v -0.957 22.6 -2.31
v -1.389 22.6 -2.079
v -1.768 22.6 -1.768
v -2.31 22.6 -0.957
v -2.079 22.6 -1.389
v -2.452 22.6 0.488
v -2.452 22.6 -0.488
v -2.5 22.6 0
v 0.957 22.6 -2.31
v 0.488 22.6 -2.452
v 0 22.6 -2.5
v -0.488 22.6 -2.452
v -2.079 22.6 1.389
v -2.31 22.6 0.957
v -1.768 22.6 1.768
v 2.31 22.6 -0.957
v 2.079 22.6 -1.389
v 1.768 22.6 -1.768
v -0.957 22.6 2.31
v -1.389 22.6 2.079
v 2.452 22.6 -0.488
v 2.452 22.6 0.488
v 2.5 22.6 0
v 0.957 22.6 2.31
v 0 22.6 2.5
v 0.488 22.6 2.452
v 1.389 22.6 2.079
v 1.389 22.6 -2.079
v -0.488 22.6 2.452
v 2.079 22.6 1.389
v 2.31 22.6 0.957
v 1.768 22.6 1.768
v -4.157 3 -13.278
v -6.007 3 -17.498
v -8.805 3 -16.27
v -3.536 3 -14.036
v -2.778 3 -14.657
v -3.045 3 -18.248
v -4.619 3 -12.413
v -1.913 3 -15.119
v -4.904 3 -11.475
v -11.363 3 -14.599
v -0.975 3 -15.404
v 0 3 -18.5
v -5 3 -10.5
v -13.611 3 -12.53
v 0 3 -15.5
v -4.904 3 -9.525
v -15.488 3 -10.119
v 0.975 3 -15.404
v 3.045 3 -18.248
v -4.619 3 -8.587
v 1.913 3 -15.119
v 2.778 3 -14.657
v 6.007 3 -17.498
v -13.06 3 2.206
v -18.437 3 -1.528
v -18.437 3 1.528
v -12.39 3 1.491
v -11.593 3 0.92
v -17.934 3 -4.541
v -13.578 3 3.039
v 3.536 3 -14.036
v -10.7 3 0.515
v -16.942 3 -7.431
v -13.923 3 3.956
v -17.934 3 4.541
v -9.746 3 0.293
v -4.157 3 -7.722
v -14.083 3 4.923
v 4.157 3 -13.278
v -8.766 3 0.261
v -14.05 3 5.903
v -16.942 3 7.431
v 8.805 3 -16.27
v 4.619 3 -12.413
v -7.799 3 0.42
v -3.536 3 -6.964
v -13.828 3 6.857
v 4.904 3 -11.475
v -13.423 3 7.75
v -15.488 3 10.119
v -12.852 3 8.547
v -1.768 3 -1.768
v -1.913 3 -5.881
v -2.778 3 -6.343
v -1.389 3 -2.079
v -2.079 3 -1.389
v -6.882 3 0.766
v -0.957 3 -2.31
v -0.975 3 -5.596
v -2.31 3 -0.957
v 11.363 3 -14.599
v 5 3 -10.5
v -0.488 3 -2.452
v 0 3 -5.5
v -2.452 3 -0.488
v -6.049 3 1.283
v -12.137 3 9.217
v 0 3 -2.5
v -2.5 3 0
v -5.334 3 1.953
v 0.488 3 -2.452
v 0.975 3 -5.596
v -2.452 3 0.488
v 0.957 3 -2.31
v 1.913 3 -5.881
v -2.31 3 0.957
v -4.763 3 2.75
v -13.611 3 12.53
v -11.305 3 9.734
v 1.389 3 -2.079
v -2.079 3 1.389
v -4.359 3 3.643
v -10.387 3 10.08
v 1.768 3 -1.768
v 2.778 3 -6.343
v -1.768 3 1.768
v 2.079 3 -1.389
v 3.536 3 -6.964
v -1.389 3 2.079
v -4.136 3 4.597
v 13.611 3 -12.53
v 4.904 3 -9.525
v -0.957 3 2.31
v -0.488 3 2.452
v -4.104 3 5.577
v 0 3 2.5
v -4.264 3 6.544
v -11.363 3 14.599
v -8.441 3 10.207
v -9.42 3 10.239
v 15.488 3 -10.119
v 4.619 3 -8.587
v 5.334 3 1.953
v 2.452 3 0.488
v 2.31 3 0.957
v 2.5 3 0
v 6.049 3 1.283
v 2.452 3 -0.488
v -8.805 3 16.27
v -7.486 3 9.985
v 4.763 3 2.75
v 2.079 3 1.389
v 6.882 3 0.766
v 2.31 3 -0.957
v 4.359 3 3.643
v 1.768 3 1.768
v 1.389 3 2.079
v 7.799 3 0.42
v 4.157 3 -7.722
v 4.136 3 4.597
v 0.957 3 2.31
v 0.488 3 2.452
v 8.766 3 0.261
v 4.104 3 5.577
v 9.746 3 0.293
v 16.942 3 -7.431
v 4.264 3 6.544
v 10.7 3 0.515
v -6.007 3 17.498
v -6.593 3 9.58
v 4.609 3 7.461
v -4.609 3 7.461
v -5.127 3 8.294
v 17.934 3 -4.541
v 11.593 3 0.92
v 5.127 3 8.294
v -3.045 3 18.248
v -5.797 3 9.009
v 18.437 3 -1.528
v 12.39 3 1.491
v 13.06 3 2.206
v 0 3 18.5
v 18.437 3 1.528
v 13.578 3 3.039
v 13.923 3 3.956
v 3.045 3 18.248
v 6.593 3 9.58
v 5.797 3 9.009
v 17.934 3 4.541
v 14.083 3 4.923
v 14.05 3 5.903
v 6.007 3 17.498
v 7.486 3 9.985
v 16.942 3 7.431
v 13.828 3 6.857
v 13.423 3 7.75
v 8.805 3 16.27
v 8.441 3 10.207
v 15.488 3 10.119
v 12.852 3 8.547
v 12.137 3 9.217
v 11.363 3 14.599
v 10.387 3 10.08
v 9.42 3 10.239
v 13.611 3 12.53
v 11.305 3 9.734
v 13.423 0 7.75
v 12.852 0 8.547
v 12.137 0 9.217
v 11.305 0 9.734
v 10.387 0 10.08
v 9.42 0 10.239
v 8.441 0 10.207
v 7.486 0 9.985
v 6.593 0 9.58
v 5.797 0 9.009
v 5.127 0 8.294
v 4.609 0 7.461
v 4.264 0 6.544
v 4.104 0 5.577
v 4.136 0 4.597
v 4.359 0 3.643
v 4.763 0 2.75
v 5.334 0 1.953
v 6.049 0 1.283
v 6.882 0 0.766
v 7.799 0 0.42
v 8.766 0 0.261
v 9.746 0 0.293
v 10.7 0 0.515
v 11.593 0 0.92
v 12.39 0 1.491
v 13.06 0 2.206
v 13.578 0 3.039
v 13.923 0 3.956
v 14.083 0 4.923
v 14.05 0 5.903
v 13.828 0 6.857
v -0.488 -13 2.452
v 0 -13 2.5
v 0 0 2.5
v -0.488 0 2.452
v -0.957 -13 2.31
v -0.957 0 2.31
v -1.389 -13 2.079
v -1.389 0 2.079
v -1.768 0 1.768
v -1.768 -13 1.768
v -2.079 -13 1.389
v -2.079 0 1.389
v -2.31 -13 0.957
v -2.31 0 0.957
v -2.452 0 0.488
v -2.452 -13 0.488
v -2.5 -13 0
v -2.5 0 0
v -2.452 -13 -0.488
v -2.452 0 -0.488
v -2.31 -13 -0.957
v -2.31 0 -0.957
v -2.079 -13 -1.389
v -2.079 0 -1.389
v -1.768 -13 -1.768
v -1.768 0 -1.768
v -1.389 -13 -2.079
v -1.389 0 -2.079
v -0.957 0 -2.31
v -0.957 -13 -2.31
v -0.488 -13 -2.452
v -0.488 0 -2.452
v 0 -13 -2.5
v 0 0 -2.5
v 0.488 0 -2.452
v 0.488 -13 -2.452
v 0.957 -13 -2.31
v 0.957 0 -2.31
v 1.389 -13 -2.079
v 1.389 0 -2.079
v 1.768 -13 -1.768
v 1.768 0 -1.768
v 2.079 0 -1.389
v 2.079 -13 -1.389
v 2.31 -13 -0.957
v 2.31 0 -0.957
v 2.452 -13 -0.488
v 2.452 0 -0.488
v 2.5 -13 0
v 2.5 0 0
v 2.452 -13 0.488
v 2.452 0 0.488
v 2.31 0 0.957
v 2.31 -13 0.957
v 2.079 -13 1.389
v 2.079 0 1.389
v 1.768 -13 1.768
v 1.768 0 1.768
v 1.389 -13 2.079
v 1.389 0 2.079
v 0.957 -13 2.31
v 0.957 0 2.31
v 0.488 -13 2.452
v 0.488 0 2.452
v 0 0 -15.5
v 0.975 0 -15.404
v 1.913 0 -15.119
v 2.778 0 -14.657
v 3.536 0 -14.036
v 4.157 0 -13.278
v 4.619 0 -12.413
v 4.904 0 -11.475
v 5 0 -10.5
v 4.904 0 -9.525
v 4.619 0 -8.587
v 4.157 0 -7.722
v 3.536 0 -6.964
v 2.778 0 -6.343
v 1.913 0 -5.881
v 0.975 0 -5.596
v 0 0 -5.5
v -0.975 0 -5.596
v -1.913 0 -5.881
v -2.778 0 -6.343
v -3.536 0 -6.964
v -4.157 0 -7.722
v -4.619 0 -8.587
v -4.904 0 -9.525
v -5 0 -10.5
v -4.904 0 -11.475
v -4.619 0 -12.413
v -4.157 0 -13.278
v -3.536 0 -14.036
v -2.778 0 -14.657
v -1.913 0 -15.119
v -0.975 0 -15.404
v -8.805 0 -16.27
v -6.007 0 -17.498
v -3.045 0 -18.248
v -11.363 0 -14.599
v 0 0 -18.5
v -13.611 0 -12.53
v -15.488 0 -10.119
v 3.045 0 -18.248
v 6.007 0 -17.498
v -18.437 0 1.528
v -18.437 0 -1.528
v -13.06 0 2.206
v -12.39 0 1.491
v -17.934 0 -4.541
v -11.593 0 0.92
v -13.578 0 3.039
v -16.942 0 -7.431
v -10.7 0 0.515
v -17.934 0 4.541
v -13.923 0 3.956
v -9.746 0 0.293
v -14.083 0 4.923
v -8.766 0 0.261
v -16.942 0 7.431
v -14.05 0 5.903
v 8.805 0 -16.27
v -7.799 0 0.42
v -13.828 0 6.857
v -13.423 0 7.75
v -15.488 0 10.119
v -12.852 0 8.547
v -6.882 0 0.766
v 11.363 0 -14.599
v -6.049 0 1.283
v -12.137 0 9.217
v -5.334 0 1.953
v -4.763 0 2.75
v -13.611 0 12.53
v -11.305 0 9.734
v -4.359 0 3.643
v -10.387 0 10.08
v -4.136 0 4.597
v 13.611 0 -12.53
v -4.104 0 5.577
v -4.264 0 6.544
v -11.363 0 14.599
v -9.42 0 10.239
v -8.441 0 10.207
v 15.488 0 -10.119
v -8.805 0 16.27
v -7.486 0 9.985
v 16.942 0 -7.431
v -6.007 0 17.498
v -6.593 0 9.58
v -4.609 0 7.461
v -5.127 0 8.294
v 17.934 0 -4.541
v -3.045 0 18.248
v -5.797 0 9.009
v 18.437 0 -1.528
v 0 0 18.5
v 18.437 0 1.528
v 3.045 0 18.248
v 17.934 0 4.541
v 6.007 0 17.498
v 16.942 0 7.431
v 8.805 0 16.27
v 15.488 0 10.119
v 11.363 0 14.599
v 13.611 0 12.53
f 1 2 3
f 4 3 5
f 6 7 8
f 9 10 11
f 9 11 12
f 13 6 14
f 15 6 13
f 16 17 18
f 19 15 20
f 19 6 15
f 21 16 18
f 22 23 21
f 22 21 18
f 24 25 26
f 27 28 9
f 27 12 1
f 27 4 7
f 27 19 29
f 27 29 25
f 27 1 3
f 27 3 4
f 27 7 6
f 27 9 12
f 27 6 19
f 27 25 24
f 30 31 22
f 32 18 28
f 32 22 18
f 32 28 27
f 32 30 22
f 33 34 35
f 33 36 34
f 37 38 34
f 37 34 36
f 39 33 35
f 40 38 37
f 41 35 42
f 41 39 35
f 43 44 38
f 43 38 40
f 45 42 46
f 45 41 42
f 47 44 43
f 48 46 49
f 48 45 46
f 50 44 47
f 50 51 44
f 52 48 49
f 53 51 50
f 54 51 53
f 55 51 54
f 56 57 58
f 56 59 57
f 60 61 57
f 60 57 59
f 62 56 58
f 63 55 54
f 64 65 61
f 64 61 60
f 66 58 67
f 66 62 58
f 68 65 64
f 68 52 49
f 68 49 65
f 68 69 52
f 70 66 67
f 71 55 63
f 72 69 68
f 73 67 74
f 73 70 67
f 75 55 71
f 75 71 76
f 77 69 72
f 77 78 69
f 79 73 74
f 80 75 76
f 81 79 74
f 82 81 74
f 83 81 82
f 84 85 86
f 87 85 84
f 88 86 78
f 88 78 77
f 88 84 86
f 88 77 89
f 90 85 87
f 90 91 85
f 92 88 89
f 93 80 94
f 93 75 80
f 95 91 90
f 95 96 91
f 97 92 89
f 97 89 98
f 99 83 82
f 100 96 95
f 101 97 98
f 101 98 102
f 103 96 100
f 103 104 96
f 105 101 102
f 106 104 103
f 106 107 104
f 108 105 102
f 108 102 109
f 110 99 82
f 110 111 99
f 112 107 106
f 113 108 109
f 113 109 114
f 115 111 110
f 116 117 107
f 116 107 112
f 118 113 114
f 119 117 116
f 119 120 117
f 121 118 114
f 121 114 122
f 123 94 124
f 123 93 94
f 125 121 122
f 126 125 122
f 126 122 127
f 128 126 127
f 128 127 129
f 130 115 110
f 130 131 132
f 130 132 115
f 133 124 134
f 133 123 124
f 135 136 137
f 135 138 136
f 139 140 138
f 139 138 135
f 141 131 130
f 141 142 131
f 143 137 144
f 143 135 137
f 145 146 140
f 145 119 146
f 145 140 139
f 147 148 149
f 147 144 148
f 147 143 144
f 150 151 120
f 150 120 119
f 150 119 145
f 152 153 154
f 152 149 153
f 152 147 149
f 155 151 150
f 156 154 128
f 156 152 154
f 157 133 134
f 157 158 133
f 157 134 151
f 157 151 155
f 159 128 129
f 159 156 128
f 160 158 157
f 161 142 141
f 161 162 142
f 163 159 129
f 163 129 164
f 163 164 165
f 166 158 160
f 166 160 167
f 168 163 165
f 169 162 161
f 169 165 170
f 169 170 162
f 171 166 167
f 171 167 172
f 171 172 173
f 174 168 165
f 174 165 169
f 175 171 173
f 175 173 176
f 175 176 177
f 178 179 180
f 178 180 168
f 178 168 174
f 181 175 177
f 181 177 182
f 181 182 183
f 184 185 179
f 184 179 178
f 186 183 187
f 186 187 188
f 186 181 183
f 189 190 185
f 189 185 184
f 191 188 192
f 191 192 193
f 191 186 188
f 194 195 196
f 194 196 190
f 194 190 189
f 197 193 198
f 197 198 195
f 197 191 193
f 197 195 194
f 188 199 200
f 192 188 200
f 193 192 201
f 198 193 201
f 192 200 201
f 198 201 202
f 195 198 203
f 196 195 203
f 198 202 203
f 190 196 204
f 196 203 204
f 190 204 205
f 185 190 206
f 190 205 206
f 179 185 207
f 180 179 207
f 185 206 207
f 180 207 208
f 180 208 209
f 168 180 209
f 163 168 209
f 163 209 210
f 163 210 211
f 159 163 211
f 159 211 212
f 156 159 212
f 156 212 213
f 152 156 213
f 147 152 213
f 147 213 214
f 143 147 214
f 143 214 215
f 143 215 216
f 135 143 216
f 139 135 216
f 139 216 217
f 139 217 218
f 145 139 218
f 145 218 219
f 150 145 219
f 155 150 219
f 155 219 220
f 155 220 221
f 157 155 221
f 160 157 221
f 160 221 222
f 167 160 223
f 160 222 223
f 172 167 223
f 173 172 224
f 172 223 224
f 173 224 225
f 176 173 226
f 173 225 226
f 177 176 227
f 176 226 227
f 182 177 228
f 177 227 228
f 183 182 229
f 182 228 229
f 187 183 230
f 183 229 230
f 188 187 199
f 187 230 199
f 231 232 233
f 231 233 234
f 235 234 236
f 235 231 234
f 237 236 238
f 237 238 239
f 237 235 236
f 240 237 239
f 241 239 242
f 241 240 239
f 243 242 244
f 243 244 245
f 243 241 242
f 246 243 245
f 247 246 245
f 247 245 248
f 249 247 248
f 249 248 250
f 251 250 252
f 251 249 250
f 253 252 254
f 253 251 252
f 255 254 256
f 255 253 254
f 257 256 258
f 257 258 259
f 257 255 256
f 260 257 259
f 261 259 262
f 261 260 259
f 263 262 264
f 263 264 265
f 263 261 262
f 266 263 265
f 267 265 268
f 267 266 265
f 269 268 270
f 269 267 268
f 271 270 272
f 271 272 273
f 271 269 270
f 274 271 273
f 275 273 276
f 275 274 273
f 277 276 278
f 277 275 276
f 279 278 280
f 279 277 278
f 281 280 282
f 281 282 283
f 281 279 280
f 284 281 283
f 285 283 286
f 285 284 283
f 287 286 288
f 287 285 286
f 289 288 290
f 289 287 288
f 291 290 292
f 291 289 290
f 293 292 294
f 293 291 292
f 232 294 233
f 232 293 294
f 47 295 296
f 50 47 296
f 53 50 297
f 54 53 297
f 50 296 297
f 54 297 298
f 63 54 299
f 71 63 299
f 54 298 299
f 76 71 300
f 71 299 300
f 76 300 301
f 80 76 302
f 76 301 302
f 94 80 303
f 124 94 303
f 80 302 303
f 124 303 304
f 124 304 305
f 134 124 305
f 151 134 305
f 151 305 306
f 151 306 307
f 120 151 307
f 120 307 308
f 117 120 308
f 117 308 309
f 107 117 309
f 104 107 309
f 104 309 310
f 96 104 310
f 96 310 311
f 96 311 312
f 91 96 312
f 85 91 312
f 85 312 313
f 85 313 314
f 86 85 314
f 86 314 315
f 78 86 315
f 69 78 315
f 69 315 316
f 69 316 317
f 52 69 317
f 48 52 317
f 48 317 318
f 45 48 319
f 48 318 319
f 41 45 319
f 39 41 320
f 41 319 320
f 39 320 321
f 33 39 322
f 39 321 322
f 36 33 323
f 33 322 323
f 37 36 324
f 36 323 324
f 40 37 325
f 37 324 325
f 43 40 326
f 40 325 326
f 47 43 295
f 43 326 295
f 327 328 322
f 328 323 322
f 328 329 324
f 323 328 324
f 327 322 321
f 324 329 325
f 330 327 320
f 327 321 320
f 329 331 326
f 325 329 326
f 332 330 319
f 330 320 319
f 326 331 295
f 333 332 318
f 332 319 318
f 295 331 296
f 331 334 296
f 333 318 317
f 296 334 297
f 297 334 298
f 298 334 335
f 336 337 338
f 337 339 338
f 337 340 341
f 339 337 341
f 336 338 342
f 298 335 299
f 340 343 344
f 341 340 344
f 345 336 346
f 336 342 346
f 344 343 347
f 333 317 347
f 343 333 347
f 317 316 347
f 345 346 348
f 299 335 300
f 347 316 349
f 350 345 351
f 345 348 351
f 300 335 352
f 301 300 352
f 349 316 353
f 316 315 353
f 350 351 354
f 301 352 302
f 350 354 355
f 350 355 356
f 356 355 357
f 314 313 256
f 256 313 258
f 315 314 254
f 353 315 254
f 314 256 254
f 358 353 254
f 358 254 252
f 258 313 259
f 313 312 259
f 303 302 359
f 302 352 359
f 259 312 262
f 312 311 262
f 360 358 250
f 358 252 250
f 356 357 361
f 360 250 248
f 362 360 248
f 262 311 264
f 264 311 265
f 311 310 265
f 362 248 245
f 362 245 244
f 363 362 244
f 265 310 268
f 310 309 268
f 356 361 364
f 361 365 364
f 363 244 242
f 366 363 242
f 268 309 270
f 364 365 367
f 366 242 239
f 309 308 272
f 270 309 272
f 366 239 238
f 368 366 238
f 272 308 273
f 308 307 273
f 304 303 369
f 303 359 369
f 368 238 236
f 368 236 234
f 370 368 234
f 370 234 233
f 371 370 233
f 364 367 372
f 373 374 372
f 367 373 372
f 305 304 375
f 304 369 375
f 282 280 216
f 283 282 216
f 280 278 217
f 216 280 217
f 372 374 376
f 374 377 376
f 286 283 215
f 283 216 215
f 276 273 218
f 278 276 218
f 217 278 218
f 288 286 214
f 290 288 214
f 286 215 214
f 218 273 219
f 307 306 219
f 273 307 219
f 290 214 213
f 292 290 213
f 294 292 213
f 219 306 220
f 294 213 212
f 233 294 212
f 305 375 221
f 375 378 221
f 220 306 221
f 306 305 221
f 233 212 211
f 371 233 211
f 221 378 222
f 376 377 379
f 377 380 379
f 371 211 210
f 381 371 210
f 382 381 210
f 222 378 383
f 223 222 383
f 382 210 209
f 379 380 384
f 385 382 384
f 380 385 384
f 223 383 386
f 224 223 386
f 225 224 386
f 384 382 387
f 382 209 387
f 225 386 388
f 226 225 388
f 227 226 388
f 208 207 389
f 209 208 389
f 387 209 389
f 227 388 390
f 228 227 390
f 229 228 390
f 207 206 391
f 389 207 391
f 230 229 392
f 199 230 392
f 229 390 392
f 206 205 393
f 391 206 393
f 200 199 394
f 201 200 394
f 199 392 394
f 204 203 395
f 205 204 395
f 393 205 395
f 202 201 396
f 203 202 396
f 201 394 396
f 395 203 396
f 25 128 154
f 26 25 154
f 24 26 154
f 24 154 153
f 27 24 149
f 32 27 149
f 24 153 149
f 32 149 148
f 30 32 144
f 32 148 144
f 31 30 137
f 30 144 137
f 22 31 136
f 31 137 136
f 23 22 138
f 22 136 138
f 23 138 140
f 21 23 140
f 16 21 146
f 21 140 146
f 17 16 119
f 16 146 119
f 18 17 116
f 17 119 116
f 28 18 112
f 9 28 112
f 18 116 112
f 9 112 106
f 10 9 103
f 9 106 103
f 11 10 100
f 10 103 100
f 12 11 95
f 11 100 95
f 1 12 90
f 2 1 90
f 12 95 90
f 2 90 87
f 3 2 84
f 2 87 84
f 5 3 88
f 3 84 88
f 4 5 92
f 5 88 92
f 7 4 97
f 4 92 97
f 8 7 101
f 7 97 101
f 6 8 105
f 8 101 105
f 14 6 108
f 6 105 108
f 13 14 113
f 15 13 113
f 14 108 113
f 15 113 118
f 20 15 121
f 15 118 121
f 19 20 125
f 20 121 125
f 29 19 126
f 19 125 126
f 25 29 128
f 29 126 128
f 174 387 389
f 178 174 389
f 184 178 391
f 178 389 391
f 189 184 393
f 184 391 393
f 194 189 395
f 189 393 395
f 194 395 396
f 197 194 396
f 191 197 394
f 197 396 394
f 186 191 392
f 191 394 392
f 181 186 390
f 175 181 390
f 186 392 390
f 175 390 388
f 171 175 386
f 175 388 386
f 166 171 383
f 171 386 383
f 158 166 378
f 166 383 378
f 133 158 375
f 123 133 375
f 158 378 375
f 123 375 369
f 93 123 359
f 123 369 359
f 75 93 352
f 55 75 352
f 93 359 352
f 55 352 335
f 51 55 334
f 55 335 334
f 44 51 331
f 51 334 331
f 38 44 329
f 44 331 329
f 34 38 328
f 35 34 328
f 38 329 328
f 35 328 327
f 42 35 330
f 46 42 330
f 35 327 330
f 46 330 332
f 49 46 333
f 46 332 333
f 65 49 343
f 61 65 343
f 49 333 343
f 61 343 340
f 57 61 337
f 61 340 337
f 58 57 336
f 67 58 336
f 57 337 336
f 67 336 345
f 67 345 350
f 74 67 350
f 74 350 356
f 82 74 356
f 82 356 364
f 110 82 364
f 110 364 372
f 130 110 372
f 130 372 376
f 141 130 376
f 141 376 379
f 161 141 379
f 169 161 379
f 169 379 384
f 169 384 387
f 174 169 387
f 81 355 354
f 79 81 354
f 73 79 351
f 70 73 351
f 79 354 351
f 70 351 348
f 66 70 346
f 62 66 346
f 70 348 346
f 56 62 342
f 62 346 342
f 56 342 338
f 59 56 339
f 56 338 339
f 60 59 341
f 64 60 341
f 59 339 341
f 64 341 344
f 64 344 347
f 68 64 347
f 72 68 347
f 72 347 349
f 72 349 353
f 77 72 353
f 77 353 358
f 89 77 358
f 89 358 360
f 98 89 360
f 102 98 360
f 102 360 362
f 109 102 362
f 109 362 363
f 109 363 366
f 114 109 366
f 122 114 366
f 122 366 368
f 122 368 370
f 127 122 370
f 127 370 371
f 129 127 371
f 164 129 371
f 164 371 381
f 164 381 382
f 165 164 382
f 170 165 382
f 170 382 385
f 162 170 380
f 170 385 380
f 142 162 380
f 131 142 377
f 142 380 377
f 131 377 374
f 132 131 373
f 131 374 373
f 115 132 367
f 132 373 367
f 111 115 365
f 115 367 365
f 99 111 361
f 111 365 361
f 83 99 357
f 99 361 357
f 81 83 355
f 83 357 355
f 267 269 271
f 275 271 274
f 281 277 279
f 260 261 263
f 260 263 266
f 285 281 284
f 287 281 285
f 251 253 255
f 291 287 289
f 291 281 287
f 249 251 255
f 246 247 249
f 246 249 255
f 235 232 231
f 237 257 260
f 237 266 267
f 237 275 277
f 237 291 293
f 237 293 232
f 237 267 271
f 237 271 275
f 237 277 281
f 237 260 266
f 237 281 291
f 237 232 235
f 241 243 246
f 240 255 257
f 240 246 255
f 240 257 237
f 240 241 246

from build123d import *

# Parameters (mm, degrees)
SKETCH_1_R               = 18.5
EXTRUDE_1_DEPTH          = 3
SKETCH_2_R               = 2.5
EXTRUDE_2_DEPTH          = 19.6
EXTRUDE_START            = 13
SKETCH_3_R               = 2.5
EXTRUDE_3_DEPTH          = 13
CUT_EXTRUDE_1_REACH      = 36.573
SKETCH_4_R               = 5
PATTERN_CIRCULAR_1_COUNT = 3


with BuildPart() as part:
    # 草图1 → 凸台-拉伸1 (new body)
    with BuildSketch(Plane(origin=(0, 0, 0), x_dir=(1, 0, 0), z_dir=(0, 1, 0))):
        with Locations(Location((0, 0, 0), (0, 0, 270))):
            Circle(SKETCH_1_R)
    extrude(amount=EXTRUDE_1_DEPTH)

    # 草图2 → 凸台-拉伸2 (add)
    with BuildSketch(Plane(origin=(0, 3, 0), x_dir=(1, 0, 0), z_dir=(0, 1, 0))):
        with Locations(Location((0, 0, 0), (0, 0, 270))):
            Circle(SKETCH_2_R)
    extrude(amount=EXTRUDE_2_DEPTH)

    # 草图3 → 凸台-拉伸3 (add)
    with BuildSketch(Plane(origin=(0, 0, 0), x_dir=(-1, 0, 0), z_dir=(0, -1, 0)).offset(EXTRUDE_START)):
        with Locations(Location((0, 0, 0), (0, 0, 270))):
            Circle(SKETCH_3_R)
    extrude(amount=-EXTRUDE_3_DEPTH)

    # 草图4 → 切除-拉伸1 (cut, up to next)
    with BuildSketch(Plane(origin=(0, 0, 0), x_dir=(-1, 0, 0), z_dir=(0, -1, 0)), mode=Mode.PRIVATE) as cut_extrude_1_sk1:
        with Locations(Location((0, 10.5, 0), (0, 0, 90))):
            Circle(SKETCH_4_R)
    cut_extrude_1_tool1 = extrude(cut_extrude_1_sk1.sketch, amount=-CUT_EXTRUDE_1_REACH, mode=Mode.PRIVATE) & part.part
    cut_extrude_1 = cut_extrude_1_tool1.solids().sort_by_distance((0, 0, -10.5))[0]
    add(cut_extrude_1, mode=Mode.SUBTRACT)

    # 阵列(圆周)1: 切除-拉伸1 ×3 about axis
    pattern_circular_1_axis = Axis((0, 0, 0), (0, 1, 0))
    for i in range(1, PATTERN_CIRCULAR_1_COUNT):
        add(cut_extrude_1.rotate(pattern_circular_1_axis, i * 360 / PATTERN_CIRCULAR_1_COUNT), mode=Mode.SUBTRACT)


solid = part.part
